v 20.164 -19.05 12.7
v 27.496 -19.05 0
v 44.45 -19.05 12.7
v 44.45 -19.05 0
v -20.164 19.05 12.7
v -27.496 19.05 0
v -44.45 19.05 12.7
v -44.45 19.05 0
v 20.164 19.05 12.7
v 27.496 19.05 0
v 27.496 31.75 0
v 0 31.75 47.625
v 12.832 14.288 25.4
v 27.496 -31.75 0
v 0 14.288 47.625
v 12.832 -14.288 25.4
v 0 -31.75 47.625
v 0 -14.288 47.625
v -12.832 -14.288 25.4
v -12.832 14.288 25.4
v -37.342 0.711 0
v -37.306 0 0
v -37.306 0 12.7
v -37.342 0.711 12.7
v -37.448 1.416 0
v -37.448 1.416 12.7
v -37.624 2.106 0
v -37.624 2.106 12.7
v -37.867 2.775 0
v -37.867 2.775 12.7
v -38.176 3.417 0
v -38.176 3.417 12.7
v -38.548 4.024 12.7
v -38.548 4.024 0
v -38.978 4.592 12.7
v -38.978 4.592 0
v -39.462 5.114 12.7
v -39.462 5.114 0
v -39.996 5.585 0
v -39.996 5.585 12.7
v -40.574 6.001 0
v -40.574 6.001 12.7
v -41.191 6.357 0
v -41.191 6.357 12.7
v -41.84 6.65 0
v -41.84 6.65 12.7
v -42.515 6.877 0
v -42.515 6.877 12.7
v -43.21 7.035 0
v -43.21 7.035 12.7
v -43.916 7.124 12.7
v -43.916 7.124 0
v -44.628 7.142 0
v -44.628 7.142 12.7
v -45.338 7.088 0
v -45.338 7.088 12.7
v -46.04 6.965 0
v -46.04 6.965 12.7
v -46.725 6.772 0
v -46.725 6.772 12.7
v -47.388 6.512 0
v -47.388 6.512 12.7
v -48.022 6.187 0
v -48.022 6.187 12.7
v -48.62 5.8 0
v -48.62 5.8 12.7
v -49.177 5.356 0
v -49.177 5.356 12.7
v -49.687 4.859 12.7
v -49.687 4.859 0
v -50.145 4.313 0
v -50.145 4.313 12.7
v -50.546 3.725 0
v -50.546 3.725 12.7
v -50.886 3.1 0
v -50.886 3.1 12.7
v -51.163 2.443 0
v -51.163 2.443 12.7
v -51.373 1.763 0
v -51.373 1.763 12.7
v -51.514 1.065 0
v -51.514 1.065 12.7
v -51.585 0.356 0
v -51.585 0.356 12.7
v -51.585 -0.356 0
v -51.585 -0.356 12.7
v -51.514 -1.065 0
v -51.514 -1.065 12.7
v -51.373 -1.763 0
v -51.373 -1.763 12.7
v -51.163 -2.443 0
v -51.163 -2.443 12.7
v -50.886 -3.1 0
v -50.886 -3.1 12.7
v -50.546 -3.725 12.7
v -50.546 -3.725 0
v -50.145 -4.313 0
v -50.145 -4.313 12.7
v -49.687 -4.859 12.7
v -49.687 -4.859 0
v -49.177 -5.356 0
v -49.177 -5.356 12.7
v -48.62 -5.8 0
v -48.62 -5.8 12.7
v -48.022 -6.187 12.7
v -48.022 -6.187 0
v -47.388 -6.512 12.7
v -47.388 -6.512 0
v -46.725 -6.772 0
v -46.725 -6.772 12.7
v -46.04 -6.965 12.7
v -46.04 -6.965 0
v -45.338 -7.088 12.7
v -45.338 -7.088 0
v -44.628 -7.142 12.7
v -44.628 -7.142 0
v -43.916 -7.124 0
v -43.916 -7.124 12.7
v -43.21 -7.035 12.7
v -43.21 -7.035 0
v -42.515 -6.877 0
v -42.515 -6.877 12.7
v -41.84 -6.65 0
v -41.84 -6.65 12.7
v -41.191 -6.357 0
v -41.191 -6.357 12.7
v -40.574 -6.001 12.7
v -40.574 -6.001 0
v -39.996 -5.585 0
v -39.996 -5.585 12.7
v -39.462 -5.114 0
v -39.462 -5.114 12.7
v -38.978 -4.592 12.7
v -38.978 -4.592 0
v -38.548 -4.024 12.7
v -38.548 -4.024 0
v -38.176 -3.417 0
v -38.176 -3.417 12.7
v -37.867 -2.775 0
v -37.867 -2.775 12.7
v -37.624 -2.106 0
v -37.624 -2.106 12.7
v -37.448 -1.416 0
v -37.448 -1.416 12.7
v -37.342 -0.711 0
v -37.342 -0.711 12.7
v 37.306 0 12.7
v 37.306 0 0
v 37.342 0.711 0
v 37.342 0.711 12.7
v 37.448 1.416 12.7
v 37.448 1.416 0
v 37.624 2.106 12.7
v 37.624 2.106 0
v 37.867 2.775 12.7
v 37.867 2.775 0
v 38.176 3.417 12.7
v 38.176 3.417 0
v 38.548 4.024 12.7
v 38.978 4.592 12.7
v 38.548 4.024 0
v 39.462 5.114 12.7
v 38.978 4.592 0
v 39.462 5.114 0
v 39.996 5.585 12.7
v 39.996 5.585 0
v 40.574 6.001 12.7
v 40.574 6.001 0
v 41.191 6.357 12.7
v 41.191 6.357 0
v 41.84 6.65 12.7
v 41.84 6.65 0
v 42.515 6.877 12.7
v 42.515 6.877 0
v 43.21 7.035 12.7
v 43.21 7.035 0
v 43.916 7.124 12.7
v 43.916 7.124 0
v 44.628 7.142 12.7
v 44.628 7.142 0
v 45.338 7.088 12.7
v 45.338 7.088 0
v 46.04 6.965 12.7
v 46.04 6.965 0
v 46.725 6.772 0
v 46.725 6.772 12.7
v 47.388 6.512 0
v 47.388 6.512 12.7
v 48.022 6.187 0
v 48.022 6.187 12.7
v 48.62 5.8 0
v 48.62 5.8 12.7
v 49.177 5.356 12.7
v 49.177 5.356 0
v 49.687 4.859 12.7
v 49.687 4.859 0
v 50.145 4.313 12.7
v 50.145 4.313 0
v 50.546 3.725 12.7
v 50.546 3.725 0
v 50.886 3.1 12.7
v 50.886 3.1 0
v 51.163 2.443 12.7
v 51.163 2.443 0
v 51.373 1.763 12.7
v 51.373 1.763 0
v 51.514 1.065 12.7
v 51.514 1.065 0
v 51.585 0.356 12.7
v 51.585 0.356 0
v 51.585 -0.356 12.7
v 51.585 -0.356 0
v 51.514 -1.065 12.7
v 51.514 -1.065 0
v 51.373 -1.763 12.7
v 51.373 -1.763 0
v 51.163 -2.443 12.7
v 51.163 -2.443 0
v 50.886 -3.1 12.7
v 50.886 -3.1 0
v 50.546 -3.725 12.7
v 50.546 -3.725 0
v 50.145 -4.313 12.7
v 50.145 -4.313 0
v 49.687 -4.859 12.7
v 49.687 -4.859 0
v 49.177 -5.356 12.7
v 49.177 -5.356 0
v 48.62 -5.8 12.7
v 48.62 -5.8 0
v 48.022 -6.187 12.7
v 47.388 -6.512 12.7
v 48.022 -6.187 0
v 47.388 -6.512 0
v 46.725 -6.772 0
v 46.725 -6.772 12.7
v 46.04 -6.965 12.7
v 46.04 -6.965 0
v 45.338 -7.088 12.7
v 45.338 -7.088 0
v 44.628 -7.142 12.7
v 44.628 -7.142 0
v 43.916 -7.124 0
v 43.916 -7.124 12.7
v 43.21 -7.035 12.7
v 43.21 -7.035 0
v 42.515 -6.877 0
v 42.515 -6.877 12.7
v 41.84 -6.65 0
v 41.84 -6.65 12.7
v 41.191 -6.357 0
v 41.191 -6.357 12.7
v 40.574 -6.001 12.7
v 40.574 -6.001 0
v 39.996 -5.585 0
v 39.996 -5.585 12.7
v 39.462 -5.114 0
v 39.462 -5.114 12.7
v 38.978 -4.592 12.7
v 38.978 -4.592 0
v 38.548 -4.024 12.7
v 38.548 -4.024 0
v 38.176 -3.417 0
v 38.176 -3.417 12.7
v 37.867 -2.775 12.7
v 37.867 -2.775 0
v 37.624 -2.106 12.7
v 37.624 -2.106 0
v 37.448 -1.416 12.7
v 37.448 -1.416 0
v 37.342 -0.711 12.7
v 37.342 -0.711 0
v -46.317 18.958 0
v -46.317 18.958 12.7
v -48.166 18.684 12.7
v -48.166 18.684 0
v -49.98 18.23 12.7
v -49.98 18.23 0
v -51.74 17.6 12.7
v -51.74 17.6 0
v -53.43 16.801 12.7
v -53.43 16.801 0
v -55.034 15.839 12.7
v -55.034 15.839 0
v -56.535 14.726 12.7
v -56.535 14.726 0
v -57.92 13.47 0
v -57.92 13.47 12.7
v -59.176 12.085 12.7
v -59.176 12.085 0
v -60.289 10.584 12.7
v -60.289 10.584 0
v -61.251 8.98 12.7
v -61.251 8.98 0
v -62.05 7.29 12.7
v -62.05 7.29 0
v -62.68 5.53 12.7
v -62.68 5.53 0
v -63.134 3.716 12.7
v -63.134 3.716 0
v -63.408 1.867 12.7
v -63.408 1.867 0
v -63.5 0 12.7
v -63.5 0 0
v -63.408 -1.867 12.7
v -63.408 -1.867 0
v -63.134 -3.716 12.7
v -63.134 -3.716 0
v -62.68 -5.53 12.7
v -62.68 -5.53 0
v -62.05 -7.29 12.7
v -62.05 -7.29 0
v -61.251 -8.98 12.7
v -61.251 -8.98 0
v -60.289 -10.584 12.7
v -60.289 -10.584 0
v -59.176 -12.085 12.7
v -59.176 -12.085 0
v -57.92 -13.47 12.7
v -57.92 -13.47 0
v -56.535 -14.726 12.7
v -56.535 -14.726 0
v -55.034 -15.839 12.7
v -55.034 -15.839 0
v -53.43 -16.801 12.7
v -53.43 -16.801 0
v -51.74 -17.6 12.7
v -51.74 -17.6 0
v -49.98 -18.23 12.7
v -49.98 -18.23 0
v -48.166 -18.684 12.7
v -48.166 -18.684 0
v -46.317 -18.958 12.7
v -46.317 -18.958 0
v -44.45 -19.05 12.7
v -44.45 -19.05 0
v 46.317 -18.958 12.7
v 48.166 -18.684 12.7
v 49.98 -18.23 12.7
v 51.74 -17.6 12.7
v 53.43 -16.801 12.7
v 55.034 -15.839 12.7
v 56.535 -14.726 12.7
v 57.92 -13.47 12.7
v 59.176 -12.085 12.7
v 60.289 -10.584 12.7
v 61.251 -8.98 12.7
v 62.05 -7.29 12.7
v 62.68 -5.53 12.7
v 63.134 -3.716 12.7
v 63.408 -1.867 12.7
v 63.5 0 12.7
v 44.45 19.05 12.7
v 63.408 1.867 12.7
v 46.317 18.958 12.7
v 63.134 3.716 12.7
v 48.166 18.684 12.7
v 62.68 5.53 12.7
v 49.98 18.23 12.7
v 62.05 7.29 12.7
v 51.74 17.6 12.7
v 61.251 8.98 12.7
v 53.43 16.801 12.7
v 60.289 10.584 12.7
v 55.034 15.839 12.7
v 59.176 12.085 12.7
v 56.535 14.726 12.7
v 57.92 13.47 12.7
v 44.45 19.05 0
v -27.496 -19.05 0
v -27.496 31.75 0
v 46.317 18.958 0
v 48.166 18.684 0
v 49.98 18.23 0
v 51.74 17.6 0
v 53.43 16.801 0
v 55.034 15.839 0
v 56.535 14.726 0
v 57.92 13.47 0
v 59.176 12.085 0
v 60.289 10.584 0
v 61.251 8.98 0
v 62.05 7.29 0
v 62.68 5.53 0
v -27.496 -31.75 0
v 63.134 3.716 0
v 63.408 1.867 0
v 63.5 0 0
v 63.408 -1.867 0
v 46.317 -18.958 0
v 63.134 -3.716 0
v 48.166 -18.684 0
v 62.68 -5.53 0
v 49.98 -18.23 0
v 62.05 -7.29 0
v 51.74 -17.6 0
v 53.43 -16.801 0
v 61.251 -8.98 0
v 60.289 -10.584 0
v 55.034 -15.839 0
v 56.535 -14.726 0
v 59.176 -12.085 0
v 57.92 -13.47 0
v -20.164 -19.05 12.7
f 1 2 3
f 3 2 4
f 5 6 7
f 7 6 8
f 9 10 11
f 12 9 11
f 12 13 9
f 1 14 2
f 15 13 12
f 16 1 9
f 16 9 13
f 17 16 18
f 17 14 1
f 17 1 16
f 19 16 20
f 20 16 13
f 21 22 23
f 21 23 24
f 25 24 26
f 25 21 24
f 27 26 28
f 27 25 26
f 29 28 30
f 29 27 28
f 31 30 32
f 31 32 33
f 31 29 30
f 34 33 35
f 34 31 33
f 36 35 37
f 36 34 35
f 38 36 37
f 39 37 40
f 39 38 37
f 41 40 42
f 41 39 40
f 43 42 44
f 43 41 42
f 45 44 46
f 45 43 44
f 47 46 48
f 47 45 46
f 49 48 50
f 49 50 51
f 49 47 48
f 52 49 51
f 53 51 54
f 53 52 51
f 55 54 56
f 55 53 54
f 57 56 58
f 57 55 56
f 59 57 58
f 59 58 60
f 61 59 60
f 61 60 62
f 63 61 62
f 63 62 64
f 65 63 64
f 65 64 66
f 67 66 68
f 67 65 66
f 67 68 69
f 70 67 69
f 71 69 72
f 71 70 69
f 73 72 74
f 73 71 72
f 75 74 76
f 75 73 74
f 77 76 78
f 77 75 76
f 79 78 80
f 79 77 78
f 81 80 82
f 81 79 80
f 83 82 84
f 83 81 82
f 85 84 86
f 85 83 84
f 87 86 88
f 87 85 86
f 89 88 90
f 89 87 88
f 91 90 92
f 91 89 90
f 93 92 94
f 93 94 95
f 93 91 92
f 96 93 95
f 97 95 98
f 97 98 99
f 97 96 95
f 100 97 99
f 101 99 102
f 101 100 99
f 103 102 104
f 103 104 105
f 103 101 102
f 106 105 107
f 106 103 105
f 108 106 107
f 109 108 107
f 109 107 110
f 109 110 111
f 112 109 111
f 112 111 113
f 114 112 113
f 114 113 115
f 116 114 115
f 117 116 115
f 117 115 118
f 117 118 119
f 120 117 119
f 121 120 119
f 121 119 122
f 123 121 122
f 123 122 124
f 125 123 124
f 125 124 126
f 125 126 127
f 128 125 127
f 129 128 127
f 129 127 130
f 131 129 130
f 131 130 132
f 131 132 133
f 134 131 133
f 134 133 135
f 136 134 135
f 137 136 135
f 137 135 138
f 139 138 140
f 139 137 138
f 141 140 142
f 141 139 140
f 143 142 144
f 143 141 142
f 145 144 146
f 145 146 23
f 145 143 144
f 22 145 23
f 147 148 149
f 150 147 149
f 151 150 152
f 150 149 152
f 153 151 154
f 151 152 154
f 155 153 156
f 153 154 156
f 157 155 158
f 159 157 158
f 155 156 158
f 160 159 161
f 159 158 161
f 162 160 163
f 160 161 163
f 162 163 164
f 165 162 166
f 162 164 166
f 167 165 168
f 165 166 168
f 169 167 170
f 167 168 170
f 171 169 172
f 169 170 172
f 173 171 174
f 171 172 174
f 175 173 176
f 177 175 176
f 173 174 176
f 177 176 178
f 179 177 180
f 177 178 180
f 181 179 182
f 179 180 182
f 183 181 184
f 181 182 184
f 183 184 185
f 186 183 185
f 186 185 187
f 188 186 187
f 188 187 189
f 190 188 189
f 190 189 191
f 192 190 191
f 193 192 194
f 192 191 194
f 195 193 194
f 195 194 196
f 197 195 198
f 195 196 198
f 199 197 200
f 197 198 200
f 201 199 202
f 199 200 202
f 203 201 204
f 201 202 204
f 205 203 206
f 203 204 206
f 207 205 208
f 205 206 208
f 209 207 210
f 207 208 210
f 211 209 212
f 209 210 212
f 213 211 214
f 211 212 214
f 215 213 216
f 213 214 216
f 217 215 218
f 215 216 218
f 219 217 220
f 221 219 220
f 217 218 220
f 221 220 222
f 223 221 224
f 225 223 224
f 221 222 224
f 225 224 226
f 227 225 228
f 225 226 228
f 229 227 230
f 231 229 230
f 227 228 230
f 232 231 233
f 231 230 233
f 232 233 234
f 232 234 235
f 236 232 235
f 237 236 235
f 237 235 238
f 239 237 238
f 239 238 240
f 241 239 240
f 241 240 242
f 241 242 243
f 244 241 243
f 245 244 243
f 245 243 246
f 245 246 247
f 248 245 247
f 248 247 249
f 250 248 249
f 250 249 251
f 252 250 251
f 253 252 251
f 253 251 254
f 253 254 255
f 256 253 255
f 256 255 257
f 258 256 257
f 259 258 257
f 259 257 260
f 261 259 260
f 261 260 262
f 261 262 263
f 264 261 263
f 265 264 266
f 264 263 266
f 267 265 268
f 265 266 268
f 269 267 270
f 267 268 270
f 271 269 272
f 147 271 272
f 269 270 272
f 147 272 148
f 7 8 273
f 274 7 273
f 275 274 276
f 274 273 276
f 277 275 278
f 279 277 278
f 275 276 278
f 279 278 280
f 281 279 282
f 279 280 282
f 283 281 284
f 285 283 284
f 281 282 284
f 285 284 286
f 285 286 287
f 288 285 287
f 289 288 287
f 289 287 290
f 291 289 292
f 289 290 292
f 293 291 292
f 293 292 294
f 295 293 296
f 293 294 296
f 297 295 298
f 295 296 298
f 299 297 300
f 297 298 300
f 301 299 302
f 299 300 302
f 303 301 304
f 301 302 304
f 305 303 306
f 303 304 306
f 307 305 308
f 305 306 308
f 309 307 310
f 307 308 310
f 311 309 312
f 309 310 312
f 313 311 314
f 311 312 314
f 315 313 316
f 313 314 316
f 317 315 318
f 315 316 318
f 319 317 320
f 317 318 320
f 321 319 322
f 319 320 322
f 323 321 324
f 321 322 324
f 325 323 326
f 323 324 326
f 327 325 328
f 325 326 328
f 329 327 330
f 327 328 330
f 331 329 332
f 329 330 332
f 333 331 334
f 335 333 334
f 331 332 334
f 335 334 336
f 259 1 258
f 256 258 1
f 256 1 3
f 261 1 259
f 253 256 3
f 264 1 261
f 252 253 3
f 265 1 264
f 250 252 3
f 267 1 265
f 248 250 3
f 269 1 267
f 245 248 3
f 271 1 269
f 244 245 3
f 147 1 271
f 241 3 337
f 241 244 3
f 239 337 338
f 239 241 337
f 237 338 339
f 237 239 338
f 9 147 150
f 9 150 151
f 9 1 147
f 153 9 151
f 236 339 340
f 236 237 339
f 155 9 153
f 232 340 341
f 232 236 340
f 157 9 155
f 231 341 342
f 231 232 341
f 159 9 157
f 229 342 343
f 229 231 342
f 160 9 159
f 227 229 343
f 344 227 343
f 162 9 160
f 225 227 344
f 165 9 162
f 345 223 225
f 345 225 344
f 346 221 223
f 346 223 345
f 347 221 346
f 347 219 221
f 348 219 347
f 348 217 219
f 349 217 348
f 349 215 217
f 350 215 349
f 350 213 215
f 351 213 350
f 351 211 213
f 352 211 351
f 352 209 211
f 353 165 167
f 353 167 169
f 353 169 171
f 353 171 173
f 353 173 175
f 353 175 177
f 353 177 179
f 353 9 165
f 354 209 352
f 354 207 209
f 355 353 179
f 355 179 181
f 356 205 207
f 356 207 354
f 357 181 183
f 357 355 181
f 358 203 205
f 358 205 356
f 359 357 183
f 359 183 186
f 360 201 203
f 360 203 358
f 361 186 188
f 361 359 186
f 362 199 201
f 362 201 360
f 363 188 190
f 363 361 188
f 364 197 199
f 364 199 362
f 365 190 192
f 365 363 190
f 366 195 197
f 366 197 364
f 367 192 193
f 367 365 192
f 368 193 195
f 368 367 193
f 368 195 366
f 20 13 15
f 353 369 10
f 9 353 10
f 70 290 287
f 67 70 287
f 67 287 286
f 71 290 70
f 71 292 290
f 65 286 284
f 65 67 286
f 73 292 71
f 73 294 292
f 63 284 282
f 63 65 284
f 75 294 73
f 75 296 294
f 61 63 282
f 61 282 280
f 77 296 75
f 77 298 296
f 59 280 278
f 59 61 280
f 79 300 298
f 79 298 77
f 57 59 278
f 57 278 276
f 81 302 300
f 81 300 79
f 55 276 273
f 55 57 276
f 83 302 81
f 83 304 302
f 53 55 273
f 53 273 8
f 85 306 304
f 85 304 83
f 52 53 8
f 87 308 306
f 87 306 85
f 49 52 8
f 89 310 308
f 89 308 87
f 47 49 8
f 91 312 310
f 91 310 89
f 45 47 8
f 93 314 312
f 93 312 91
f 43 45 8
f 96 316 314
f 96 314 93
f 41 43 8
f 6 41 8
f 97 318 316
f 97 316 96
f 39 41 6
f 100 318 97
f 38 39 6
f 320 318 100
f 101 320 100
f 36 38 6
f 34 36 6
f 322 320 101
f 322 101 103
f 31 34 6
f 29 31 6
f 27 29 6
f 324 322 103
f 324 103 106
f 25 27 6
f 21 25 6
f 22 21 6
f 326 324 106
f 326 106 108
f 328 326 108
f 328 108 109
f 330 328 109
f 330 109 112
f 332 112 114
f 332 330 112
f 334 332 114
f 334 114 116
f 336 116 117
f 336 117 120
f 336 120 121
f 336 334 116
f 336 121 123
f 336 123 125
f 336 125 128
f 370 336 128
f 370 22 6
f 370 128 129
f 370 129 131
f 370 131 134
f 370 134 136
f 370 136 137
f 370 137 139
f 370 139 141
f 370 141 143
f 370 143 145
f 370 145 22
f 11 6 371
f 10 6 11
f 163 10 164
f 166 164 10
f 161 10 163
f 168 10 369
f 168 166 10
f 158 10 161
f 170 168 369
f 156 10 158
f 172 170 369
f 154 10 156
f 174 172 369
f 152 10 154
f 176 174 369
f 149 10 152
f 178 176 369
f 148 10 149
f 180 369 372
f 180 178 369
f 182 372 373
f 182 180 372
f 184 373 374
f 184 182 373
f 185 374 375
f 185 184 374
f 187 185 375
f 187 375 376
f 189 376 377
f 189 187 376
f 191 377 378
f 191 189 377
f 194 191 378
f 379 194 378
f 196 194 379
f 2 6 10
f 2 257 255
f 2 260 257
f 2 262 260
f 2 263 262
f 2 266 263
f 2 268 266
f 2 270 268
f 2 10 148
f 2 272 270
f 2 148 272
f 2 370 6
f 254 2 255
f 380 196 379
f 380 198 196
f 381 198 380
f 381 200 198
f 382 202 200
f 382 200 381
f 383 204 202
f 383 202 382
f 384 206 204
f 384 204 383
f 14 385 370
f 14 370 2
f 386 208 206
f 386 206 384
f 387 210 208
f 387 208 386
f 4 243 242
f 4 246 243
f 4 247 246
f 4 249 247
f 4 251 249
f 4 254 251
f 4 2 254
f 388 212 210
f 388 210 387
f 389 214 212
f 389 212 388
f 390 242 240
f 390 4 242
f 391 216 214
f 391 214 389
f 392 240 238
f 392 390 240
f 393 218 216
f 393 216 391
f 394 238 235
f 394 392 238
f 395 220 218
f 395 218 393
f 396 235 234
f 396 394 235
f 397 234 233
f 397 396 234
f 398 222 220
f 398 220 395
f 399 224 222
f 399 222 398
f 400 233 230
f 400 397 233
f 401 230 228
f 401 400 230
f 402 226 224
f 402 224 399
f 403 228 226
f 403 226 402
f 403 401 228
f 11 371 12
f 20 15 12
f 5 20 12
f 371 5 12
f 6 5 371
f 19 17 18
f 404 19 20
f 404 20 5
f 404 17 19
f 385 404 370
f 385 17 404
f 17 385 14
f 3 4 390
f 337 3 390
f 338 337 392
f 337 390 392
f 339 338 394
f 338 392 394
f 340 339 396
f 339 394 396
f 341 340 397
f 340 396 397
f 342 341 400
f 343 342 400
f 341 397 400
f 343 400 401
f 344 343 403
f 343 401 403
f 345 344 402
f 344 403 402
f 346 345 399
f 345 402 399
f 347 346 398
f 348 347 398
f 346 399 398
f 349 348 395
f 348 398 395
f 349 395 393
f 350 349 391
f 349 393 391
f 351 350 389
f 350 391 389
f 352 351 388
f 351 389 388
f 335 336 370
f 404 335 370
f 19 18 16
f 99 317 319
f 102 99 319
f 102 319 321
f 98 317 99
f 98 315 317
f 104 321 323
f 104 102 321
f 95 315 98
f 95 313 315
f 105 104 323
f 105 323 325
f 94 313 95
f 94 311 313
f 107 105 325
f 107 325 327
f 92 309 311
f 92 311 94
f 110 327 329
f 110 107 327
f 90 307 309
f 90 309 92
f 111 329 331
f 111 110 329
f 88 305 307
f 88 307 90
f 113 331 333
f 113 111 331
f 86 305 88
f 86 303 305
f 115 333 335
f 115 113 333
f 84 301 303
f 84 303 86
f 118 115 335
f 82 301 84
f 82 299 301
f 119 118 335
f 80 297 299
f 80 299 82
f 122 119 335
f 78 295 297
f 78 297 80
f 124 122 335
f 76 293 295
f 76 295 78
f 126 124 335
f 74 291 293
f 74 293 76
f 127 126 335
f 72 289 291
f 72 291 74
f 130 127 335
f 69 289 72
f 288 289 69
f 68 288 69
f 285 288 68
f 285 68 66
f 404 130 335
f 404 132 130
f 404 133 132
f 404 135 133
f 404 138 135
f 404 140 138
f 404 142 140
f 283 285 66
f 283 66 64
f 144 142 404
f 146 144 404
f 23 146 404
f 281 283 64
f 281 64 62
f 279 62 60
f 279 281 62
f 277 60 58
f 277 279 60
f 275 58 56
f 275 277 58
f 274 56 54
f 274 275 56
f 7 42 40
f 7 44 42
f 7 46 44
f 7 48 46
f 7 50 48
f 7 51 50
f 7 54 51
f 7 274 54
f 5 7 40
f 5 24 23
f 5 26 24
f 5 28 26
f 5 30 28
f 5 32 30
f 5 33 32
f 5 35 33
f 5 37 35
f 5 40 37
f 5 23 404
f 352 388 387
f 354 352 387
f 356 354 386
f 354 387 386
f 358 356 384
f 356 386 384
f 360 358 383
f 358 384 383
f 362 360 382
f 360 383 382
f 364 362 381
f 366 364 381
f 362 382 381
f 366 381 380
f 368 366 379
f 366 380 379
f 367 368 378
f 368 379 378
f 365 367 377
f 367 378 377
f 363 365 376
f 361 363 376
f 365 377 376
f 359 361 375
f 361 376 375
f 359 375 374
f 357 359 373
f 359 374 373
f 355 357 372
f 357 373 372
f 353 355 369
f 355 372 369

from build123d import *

# Parameters (mm, degrees)
F0_R     = 7.14375
F1_DEPTH = 12.7
F3_DEPTH = 31.75
F5_DEPTH = 25.4


with BuildPart() as f1:
    # F0 (on Top) → F1 (new body)
    with BuildSketch(Plane.XY):
        with BuildLine():
            Line((-25.4, 0), (0, 0))
            Line((0, 0), (25.4, 0))
            ThreePointArc((25.4, 0), (30.9796158184, 13.4703841816), (44.45, 19.05))
            Line((44.45, 19.05), (-44.45, 19.05))
            ThreePointArc((-44.45, 19.05), (-30.9796158184, 13.4703841816), (-25.4, 0))
        make_face()
        with BuildLine():
            Line((25.4, 0), (0, 0))
            Line((0, 0), (-25.4, 0))
            ThreePointArc((-25.4, 0), (-30.9796158184, -13.4703841816), (-44.45, -19.05))
            Line((-44.45, -19.05), (44.45, -19.05))
            ThreePointArc((44.45, -19.05), (30.9796158184, -13.4703841816), (25.4, 0))
        make_face()
        with BuildLine():
            ThreePointArc((44.45, 19.05), (30.9796158184, 13.4703841816), (25.4, 0))
            ThreePointArc((25.4, 0), (30.9796158184, -13.4703841816), (44.45, -19.05))
            ThreePointArc((44.45, -19.05), (57.9203841816, -13.4703841816), (63.5, 0))
            ThreePointArc((63.5, 0), (57.9203841816, 13.4703841816), (44.45, 19.05))
        make_face()
        with BuildLine():
            ThreePointArc((51.59375, 0), (44.45, -7.14375), (37.30625, 0))
            ThreePointArc((37.30625, 0), (44.45, 7.14375), (51.59375, 0))
        make_face(mode=Mode.SUBTRACT)
        with BuildLine():
            ThreePointArc((-44.45, -19.05), (-30.9796158184, -13.4703841816), (-25.4, 0))
            ThreePointArc((-25.4, 0), (-30.9796158184, 13.4703841816), (-44.45, 19.05))
            ThreePointArc((-44.45, 19.05), (-63.5, 0), (-44.45, -19.05))
        make_face()
        with Locations((-44.45, 0)):
            Circle(F0_R, mode=Mode.SUBTRACT)
    extrude(amount=F1_DEPTH)

    # F2 (on Front) → F3 (join, symmetric)
    with BuildSketch(Plane.XZ):
        Polygon((27.4963065702, 0), (0, 47.625), (-27.4963065702, 0), align=None)
    extrude(amount=F3_DEPTH, both=True)

    # F4 (on Right) → F5 (cut, symmetric)
    with BuildSketch(Plane.YZ):
        Polygon((14.2875, 47.625), (0, 47.625), (-14.2875, 47.625), (-14.2875, 25.4), (14.2875, 25.4), align=None)
    extrude(amount=F5_DEPTH, both=True, mode=Mode.SUBTRACT)


solid = f1.part
